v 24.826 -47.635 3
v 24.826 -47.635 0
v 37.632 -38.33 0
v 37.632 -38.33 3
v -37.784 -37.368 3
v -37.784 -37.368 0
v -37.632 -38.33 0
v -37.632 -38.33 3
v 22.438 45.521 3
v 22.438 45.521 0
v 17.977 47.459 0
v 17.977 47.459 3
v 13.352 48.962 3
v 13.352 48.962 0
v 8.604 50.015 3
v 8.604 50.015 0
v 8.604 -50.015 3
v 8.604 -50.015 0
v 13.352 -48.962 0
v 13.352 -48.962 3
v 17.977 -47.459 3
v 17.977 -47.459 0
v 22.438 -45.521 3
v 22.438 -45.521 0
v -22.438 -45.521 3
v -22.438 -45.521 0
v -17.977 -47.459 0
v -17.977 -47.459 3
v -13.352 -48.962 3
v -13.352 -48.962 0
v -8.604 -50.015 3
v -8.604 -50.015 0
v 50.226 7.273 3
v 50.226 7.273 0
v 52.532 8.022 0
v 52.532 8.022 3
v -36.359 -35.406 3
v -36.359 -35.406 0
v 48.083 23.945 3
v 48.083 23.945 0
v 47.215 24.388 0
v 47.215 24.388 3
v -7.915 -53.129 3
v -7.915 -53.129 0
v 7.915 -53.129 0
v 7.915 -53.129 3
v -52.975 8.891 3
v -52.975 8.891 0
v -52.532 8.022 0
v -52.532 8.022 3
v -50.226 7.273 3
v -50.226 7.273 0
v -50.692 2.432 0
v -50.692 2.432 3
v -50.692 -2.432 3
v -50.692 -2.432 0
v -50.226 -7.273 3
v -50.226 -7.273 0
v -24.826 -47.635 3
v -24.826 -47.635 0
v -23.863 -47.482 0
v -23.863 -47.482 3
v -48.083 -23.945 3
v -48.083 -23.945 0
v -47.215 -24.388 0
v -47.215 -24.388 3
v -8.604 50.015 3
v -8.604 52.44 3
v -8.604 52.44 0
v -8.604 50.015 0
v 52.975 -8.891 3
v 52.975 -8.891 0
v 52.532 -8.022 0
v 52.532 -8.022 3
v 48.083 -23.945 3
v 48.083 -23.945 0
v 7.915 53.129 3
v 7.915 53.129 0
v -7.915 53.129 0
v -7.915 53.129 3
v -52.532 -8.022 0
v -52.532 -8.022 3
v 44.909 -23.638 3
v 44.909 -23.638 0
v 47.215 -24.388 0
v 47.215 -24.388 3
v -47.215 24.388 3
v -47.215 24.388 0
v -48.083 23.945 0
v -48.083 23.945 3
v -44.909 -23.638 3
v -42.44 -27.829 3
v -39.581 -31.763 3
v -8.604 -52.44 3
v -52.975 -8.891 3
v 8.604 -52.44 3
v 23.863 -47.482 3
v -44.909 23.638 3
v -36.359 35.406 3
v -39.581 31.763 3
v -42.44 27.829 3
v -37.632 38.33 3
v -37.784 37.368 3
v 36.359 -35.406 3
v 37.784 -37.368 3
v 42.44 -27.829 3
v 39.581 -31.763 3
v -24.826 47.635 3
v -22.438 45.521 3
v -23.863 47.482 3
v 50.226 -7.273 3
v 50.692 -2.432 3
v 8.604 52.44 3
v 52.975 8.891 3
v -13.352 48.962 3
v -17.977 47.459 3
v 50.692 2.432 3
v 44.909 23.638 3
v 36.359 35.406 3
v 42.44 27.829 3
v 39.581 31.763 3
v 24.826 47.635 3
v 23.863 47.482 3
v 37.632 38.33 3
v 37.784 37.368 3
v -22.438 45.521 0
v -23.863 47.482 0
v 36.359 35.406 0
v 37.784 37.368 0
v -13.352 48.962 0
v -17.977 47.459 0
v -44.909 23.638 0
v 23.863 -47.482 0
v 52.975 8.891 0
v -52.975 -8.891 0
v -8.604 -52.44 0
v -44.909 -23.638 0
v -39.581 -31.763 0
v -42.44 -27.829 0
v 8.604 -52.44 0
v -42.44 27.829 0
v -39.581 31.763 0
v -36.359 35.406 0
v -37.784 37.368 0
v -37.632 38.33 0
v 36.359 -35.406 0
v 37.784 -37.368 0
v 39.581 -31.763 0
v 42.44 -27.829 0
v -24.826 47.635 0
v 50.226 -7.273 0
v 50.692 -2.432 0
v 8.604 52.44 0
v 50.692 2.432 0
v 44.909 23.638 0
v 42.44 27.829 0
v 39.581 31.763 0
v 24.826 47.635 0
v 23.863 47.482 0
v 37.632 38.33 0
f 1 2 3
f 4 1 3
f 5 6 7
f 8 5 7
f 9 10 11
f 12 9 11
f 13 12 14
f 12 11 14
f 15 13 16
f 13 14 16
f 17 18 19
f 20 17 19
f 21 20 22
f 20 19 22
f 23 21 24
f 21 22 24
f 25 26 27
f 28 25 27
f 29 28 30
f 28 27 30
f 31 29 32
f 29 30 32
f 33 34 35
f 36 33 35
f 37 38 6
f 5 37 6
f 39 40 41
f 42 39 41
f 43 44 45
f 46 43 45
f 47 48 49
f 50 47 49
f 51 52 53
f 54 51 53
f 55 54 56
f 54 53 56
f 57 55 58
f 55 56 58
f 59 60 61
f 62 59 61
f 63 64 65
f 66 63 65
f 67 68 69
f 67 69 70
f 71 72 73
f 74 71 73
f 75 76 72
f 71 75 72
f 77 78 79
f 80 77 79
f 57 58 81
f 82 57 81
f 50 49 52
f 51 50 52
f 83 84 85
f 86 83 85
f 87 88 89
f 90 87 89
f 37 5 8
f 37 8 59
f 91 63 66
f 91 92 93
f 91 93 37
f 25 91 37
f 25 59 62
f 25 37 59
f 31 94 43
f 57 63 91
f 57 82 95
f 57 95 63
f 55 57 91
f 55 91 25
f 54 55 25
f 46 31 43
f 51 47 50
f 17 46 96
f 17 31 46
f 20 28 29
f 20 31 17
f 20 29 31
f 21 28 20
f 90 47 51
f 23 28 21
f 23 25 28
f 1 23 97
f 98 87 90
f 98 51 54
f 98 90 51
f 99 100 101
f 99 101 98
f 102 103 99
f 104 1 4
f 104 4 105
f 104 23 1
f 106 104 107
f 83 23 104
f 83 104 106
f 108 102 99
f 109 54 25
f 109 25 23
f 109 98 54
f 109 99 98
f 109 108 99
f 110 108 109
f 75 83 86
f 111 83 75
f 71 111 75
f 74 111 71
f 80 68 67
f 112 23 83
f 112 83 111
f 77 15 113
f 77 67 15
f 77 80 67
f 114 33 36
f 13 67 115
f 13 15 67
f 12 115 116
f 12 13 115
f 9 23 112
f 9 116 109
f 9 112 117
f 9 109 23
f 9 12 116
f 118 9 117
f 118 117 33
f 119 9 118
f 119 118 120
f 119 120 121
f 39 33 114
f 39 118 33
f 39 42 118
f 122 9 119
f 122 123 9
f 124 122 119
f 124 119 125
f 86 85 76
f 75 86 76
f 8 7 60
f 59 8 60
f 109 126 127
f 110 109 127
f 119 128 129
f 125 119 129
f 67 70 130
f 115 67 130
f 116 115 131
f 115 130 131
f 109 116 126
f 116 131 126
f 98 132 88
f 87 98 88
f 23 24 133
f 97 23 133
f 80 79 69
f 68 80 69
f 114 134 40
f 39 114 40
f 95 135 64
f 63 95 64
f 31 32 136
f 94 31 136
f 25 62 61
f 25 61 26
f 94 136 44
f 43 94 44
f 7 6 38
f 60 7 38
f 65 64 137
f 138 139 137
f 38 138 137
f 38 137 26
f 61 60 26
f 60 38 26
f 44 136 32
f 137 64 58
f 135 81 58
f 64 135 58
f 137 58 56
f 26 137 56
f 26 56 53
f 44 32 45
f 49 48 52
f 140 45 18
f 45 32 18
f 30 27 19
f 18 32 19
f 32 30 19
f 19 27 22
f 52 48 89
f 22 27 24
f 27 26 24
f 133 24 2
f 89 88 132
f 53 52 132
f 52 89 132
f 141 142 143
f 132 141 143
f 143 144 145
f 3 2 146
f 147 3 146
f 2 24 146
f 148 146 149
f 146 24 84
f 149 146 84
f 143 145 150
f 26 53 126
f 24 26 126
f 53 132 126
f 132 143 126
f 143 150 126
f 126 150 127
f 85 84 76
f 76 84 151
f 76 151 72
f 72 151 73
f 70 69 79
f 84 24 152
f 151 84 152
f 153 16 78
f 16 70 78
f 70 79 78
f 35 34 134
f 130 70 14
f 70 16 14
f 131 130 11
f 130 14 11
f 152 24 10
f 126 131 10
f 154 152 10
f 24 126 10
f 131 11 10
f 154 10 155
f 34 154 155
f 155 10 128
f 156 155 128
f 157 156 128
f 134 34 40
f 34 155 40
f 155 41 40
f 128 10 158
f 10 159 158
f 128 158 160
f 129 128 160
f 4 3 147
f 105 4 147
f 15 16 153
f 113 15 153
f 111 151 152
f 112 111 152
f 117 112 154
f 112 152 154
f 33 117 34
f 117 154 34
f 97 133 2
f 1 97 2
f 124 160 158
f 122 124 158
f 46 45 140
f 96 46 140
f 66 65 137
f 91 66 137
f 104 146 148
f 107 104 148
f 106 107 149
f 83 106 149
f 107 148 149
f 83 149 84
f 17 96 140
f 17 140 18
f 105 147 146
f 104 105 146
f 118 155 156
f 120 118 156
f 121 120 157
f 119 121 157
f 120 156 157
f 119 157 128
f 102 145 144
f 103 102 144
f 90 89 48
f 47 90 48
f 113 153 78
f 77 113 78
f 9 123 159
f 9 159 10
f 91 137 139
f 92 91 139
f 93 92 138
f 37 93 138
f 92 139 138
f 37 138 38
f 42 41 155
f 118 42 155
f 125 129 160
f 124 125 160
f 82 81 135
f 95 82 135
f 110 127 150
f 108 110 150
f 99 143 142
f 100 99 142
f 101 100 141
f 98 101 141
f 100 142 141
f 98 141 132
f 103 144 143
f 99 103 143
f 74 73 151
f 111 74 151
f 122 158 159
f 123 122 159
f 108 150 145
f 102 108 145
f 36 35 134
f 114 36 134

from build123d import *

# Parameters (mm, degrees)
BOSS_EXTRUDE1_DEPTH = 3


with BuildPart() as part:
    # Base_Sketch → Boss-Extrude1 (new body)
    with BuildSketch(Plane.XY):
        with BuildLine():
            Line((-8.603981625, 52.439957176), (-8.603981625, 50.01533765))
            ThreePointArc((-8.603981625, 50.01533765), (-15.682612465, 48.266118202), (-22.437510505, 45.520551648))
            Line((-22.437510505, 45.520551648), (-23.862666105, 47.48211005))
            Line((-23.862666105, 47.48211005), (-24.825537526, 47.634613901))
            Line((-24.825537526, 47.634613901), (-37.631696962, 38.33039445))
            Line((-37.631696962, 38.33039445), (-37.784200813, 37.36752303))
            Line((-37.784200813, 37.36752303), (-36.359045213, 35.405964628))
            ThreePointArc((-36.359045213, 35.405964628), (-41.057612465, 29.830101554), (-44.908636245, 23.638462104))
            Line((-44.908636245, 23.638462104), (-47.214586445, 24.387710742))
            Line((-47.214586445, 24.387710742), (-48.083205302, 23.945127328))
            Line((-48.083205302, 23.945127328), (-52.974722942, 8.890584019))
            Line((-52.974722942, 8.890584019), (-52.532139528, 8.021965161))
            Line((-52.532139528, 8.021965161), (-50.226189328, 7.272716523))
            ThreePointArc((-50.226189328, 7.272716523), (-50.75, 0), (-50.226189328, -7.272716523))
            Line((-50.226189328, -7.272716523), (-52.532139528, -8.021965161))
            Line((-52.532139528, -8.021965161), (-52.974722942, -8.890584019))
            Line((-52.974722942, -8.890584019), (-48.083205302, -23.945127328))
            Line((-48.083205302, -23.945127328), (-47.214586445, -24.387710742))
            Line((-47.214586445, -24.387710742), (-44.908636245, -23.638462104))
            ThreePointArc((-44.908636245, -23.638462104), (-41.057612465, -29.830101554), (-36.359045213, -35.405964628))
            Line((-36.359045213, -35.405964628), (-37.784200813, -37.36752303))
            Line((-37.784200813, -37.36752303), (-37.631696962, -38.33039445))
            Line((-37.631696962, -38.33039445), (-24.825537526, -47.634613901))
            Line((-24.825537526, -47.634613901), (-23.862666105, -47.48211005))
            Line((-23.862666105, -47.48211005), (-22.437510505, -45.520551648))
            ThreePointArc((-22.437510505, -45.520551648), (-15.682612465, -48.266118202), (-8.603981625, -50.01533765))
            Line((-8.603981625, -50.01533765), (-8.603981625, -52.439957176))
            Line((-8.603981625, -52.439957176), (-7.914641797, -53.129297004))
            Line((-7.914641797, -53.129297004), (7.914641797, -53.129297004))
            Line((7.914641797, -53.129297004), (8.603981625, -52.439957176))
            Line((8.603981625, -52.439957176), (8.603981625, -50.01533765))
            ThreePointArc((8.603981625, -50.01533765), (15.682612465, -48.266118202), (22.437510505, -45.520551648))
            Line((22.437510505, -45.520551648), (23.862666105, -47.48211005))
            Line((23.862666105, -47.48211005), (24.825537526, -47.634613901))
            Line((24.825537526, -47.634613901), (37.631696962, -38.33039445))
            Line((37.631696962, -38.33039445), (37.784200813, -37.36752303))
            Line((37.784200813, -37.36752303), (36.359045213, -35.405964628))
            ThreePointArc((36.359045213, -35.405964628), (41.057612465, -29.830101554), (44.908636245, -23.638462104))
            Line((44.908636245, -23.638462104), (47.214586445, -24.387710742))
            Line((47.214586445, -24.387710742), (48.083205302, -23.945127328))
            Line((48.083205302, -23.945127328), (52.974722942, -8.890584019))
            Line((52.974722942, -8.890584019), (52.532139528, -8.021965161))
            Line((52.532139528, -8.021965161), (50.226189328, -7.272716523))
            ThreePointArc((50.226189328, -7.272716523), (50.75, 0), (50.226189328, 7.272716523))
            Line((50.226189328, 7.272716523), (52.532139528, 8.021965161))
            Line((52.532139528, 8.021965161), (52.974722942, 8.890584019))
            Line((52.974722942, 8.890584019), (48.083205302, 23.945127328))
            Line((48.083205302, 23.945127328), (47.214586445, 24.387710742))
            Line((47.214586445, 24.387710742), (44.908636245, 23.638462104))
            ThreePointArc((44.908636245, 23.638462104), (41.057612465, 29.830101554), (36.359045213, 35.405964628))
            Line((36.359045213, 35.405964628), (37.784200813, 37.36752303))
            Line((37.784200813, 37.36752303), (37.631696962, 38.33039445))
            Line((37.631696962, 38.33039445), (24.825537526, 47.634613901))
            Line((24.825537526, 47.634613901), (23.862666105, 47.48211005))
            Line((23.862666105, 47.48211005), (22.437510505, 45.520551648))
            ThreePointArc((22.437510505, 45.520551648), (15.682612465, 48.266118202), (8.603981625, 50.01533765))
            Line((8.603981625, 50.01533765), (8.603981625, 52.439957176))
            Line((8.603981625, 52.439957176), (7.914641797, 53.129297004))
            Line((7.914641797, 53.129297004), (-7.914641797, 53.129297004))
            Line((-7.914641797, 53.129297004), (-8.603981625, 52.439957176))
        make_face()
    extrude(amount=BOSS_EXTRUDE1_DEPTH)


solid = part.part
